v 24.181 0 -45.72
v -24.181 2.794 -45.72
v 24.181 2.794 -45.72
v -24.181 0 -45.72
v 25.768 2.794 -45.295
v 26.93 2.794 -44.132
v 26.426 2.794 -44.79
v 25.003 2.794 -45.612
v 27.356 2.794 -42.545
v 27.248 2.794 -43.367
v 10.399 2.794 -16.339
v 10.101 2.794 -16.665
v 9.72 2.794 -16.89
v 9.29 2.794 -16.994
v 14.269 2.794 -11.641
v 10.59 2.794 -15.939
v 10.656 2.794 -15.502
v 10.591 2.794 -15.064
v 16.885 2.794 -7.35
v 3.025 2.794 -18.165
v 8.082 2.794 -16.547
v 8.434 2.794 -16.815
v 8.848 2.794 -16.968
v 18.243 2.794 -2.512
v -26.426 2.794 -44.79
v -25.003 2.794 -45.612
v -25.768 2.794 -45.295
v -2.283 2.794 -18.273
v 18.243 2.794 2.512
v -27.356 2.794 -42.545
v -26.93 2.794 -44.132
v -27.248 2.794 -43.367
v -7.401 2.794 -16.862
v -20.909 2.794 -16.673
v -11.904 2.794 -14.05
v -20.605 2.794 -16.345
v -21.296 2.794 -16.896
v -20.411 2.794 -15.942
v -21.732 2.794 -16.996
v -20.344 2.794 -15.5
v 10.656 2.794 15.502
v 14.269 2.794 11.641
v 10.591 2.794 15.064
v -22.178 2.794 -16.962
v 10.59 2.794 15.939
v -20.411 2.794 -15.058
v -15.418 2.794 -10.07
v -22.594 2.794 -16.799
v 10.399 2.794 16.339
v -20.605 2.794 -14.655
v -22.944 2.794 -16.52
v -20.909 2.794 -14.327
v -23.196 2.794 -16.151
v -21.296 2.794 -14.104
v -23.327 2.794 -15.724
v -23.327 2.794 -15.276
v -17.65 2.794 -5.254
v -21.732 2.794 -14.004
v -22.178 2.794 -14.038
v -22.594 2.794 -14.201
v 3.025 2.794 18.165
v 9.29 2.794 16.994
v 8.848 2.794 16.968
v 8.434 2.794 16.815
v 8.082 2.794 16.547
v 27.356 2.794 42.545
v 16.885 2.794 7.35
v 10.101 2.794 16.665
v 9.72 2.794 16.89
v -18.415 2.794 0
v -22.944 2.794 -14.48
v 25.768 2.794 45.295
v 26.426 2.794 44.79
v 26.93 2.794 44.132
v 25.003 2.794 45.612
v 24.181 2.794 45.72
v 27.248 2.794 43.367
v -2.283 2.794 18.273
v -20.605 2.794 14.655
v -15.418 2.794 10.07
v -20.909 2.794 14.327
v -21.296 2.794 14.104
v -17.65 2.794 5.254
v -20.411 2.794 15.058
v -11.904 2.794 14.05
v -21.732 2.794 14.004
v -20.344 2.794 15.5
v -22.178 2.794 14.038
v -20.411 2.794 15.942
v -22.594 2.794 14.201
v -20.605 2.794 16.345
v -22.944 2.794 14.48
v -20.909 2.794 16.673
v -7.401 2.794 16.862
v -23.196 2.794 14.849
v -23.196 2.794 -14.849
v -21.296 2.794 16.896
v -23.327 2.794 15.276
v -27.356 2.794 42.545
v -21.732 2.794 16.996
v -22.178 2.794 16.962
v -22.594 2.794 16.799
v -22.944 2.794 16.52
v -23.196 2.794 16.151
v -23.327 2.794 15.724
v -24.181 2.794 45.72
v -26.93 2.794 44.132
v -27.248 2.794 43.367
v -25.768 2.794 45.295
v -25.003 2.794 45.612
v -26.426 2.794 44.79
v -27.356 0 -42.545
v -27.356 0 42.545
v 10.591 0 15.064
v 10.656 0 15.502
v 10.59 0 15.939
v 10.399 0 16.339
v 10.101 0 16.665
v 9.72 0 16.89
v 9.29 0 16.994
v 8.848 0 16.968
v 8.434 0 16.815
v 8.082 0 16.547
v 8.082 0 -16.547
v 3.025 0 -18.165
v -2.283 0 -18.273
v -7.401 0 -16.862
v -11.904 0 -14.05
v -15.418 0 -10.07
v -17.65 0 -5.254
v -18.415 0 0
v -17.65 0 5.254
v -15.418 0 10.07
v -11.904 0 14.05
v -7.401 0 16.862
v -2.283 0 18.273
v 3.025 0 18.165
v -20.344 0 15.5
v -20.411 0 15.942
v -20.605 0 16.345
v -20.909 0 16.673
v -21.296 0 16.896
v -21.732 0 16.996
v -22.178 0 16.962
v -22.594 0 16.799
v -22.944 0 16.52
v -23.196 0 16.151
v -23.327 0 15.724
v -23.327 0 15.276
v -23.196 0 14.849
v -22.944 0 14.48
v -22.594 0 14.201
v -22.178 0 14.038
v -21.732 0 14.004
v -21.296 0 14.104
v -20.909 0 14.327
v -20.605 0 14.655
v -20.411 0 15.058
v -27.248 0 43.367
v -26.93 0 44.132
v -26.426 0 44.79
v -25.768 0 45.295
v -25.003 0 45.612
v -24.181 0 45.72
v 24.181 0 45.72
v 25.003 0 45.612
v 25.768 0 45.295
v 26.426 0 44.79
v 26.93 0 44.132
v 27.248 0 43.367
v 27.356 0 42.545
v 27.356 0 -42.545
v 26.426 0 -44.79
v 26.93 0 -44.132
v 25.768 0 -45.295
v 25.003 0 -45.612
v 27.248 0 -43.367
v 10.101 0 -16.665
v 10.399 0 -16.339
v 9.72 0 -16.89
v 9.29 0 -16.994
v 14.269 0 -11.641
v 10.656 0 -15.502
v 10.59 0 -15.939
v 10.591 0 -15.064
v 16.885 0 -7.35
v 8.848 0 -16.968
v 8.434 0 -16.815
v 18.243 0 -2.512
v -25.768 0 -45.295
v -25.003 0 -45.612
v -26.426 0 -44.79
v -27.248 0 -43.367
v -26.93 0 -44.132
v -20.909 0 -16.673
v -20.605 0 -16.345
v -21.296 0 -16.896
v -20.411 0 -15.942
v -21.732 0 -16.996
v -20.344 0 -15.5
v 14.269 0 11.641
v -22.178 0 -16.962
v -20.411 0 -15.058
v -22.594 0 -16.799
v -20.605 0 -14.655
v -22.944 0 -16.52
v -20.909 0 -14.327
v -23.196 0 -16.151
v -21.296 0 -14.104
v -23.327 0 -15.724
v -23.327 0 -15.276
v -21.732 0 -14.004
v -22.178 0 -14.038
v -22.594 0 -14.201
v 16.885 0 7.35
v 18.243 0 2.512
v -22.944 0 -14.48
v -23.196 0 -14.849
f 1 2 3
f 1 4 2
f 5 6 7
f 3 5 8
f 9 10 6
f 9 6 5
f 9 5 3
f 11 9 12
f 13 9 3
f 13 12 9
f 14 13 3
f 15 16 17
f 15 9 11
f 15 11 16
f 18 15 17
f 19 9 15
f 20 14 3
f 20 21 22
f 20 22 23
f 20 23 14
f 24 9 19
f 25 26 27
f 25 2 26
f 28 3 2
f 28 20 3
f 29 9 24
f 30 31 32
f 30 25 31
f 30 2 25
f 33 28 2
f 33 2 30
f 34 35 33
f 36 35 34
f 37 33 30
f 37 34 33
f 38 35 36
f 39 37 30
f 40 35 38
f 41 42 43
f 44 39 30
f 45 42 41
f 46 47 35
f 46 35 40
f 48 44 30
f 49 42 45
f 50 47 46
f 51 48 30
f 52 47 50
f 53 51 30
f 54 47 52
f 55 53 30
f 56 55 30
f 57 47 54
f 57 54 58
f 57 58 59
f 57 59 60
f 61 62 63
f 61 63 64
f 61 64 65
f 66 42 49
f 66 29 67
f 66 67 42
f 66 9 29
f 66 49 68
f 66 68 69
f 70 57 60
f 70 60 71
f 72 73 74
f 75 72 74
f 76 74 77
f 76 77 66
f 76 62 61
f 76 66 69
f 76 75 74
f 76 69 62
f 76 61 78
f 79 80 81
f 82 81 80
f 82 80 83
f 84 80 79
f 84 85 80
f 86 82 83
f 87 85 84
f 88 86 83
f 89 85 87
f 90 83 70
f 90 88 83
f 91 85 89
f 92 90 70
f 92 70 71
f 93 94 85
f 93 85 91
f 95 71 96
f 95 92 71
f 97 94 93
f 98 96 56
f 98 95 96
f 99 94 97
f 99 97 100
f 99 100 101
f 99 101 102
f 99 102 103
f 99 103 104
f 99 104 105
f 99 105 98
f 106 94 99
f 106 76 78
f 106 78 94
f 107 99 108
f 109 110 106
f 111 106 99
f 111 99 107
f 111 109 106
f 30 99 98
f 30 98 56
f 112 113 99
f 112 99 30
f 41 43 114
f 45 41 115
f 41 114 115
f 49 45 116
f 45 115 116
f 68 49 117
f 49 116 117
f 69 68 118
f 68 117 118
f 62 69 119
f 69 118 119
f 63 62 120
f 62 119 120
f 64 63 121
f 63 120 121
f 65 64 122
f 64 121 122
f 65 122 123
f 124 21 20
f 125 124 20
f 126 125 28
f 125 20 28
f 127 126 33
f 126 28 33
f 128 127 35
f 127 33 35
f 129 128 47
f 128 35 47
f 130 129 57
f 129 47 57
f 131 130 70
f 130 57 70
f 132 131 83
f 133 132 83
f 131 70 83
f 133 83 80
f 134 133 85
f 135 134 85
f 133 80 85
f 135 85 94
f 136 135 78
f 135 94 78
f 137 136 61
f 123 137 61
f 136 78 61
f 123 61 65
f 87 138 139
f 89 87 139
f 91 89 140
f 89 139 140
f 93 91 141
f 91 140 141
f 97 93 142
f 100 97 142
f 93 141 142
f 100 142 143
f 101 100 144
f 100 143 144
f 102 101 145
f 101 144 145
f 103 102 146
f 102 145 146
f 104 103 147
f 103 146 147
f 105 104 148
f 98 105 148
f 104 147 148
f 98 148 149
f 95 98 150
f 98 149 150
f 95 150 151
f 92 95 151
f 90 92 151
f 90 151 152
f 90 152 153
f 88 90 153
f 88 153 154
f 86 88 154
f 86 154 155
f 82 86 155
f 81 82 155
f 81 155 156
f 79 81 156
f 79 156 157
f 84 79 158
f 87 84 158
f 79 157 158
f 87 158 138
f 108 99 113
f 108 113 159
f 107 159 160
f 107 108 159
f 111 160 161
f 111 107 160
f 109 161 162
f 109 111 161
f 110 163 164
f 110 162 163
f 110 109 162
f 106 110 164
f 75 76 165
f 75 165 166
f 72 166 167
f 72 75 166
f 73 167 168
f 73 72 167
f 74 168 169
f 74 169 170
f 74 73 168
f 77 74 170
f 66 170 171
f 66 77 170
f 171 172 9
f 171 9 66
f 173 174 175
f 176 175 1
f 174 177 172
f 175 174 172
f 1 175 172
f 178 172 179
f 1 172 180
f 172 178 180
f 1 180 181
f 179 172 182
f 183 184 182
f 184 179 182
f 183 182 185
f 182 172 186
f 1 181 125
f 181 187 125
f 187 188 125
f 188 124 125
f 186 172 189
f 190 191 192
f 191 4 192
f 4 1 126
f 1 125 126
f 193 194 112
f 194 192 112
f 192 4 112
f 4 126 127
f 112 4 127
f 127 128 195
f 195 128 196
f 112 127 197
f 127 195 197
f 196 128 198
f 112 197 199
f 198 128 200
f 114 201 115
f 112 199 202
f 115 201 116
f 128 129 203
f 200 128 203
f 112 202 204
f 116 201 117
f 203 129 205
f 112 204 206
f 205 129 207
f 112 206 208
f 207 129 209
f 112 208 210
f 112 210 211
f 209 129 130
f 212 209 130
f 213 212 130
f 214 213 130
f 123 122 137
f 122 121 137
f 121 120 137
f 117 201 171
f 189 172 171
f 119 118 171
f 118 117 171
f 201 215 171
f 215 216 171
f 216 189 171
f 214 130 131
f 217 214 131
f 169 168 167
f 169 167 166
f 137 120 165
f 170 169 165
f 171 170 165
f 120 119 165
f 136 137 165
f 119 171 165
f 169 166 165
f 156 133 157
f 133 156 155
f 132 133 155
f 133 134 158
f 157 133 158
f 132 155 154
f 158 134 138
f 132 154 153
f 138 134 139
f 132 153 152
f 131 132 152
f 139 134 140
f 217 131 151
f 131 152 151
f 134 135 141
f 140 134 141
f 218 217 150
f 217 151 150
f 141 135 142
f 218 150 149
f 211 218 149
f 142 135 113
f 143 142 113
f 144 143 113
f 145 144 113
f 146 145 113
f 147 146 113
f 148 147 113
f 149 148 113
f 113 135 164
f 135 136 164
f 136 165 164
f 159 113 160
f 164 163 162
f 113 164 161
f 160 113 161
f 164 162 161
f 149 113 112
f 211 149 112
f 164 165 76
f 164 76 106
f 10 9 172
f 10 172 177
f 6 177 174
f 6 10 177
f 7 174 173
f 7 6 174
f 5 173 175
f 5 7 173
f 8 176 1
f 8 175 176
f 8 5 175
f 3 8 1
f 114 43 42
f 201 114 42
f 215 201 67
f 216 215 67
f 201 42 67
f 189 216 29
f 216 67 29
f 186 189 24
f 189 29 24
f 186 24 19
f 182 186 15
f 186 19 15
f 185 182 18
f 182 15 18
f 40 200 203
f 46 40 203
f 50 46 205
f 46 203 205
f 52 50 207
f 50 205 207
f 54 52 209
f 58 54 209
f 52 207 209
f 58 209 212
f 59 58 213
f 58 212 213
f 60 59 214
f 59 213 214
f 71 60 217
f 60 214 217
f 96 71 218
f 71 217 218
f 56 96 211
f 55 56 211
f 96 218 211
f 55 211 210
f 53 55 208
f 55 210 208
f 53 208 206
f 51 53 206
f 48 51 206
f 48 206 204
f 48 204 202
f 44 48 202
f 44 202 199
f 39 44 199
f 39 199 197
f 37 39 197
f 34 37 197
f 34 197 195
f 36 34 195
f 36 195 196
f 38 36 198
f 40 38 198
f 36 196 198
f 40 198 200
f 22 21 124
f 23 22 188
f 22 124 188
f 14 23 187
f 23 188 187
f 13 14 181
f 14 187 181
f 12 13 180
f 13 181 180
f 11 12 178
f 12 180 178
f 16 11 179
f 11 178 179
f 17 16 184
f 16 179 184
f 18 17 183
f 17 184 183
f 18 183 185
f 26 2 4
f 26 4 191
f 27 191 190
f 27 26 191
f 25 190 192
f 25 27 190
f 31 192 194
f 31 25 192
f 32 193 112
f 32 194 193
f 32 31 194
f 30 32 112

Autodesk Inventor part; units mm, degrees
ref_plane "YZ Plane" through (0, 0, 0) normal (1, 0, 0) x (0, 1, 0)
ref_plane "XZ Plane" through (0, 0, 0) normal (0, 1, 0) x (-1, 0, 0)
ref_plane "XY Plane" through (0, 0, 0) normal (0, 0, 1) x (1, 0, 0)
sketch "Sketch1" plane through (0, 0, 0) normal (0, 1, 0) x (-1, 0, 0)
  line L0 (-27.3558, 45.72) -> (27.3558, 45.72)
  line L1 (27.3558, 45.72) -> (27.3558, -45.72)
  line L2 (27.3558, -45.72) -> (-27.3558, -45.72)
  line L3 (-27.3558, -45.72) -> (-27.3558, 45.72)
  line L4 (-27.3558, 45.72) -> (27.3558, -45.72) construction
  line L5 (27.3558, 45.72) -> (-27.3558, -45.72) construction
  point P0 (0, 0)
  dimension "d0" = 54.7116
  dimension "d1" = 91.44
extrude "Extrusion1" add sketch "Sketch1" along normal blind 2.794
fillet "Fillet1" radius 3.175 4 edges at (-27.3558, 1.397, 45.72) (27.3558, 1.397, 45.72) (27.3558, 1.397, -45.72) (-27.3558, 1.397, -45.72)
sketch "Sketch2" plane through (0, 2.794, 0) normal (0, 1, 0) x (1, 0, 0)
  circle A0 centre (-6.3442, 0) radius 6.223
  circle A1 centre (-12.7676, 7.75) radius 1.5
  circle A2 centre (14.0792, 7.75) radius 1.5
  circle A3 centre (0.6558, 15.5) radius 1.5
  circle A4 centre (0.6558, -15.5) radius 1.5
  circle A5 centre (14.0792, -7.75) radius 1.5
  circle A6 centre (-12.7676, -7.75) radius 1.5
  line L0 (-27.3558, -45.72) -> (-27.3558, 45.72)
  line L1 (-27.3558, 45.72) -> (27.3558, 45.72)
  line L2 (27.3558, 45.72) -> (27.3558, -45.72)
  line L3 (27.3558, -45.72) -> (-27.3558, -45.72)
  circle A7 centre (0, 0) radius 18.415
  dimension "d5" = 36.83
extrude "Extrusion2" cut sketch "Sketch2" against normal blind 2.794 contours A0 | A1 | A2 | A3 | A4 | A5 | A6 | A7
sketch "Sketch3" plane through (0, 0, 0) normal (0, -1, 0) x (1, 0, 0)
  arc A0 (-39.5942, -30.48) -> (-36.5942, -30.48) centre (-38.0942, -30.48) ccw
  line L0 (-36.5942, -30.48) -> (-36.5942, -5.08)
  arc A1 (-36.5942, -5.08) -> (-39.5942, -5.08) centre (-38.0942, -5.08) ccw
  line L1 (-39.5942, -5.08) -> (-39.5942, -30.48)
  arc A2 (-39.5942, 5.08) -> (-36.5942, 5.08) centre (-38.0942, 5.08) ccw
  line L2 (-36.5942, 5.08) -> (-36.5942, 30.48)
  arc A3 (-36.5942, 30.48) -> (-39.5942, 30.48) centre (-38.0942, 30.48) ccw
  line L3 (-39.5942, 30.48) -> (-39.5942, 5.08)
  circle A4 centre (9.1558, -15.5) radius 1.5
  circle A5 centre (-21.8442, -15.5) radius 1.5
  circle A6 centre (9.1558, 15.5) radius 1.5
  circle A7 centre (-21.8442, 15.5) radius 1.5
  circle A8 centre (-6.3442, 0) radius 11
  line L4 (-10.7442, -50.8) -> (-20.9042, -50.8)
  line L5 (-20.9042, -50.8) -> (-20.9042, -45.72)
  line L6 (-20.9042, -45.72) -> (-31.0642, -45.72)
  line L7 (-31.0642, -45.72) -> (-31.0642, -50.8)
  line L8 (-31.0642, -50.8) -> (-41.2242, -50.8)
  line L9 (-41.2242, -50.8) -> (-41.2242, -45.72)
  line L10 (-41.2242, -45.72) -> (-46.3042, -45.72)
  line L11 (-46.3042, -45.72) -> (-46.3042, 45.72)
  line L12 (-46.3042, 45.72) -> (-41.2242, 45.72)
  line L13 (-41.2242, 45.72) -> (-41.2242, 50.8)
  line L14 (-41.2242, 50.8) -> (-31.0642, 50.8)
  line L15 (-31.0642, 50.8) -> (-31.0642, 45.72)
  line L16 (-31.0642, 45.72) -> (-20.9042, 45.72)
  line L17 (-20.9042, 45.72) -> (-20.9042, 50.8)
  line L18 (-20.9042, 50.8) -> (-10.7442, 50.8)
  line L19 (-10.7442, 50.8) -> (-10.7442, 45.72)
  line L20 (-10.7442, 45.72) -> (-0.5842, 45.72)
  line L21 (-0.5842, 45.72) -> (-0.5842, 50.8)
  line L22 (-0.5842, 50.8) -> (9.5758, 50.8)
  line L23 (9.5758, 50.8) -> (9.5758, 45.72)
  line L24 (9.5758, 45.72) -> (14.6558, 45.72)
  line L25 (14.6558, 45.72) -> (14.6558, -45.72)
  line L26 (14.6558, -45.72) -> (9.5758, -45.72)
  line L27 (9.5758, -45.72) -> (9.5758, -50.8)
  line L28 (9.5758, -50.8) -> (-0.5842, -50.8)
  line L29 (-0.5842, -50.8) -> (-0.5842, -45.72)
  line L30 (-0.5842, -45.72) -> (-10.7442, -45.72)
  line L31 (-10.7442, -45.72) -> (-10.7442, -50.8)
  point P0 (0, 0)
extrude "Extrusion3" cut sketch "Sketch3" against normal blind 2.794 contours A4 | A5 | A6 | A7
properties part number "MotorMountDC" material "Polycarbonate, Smoke"
